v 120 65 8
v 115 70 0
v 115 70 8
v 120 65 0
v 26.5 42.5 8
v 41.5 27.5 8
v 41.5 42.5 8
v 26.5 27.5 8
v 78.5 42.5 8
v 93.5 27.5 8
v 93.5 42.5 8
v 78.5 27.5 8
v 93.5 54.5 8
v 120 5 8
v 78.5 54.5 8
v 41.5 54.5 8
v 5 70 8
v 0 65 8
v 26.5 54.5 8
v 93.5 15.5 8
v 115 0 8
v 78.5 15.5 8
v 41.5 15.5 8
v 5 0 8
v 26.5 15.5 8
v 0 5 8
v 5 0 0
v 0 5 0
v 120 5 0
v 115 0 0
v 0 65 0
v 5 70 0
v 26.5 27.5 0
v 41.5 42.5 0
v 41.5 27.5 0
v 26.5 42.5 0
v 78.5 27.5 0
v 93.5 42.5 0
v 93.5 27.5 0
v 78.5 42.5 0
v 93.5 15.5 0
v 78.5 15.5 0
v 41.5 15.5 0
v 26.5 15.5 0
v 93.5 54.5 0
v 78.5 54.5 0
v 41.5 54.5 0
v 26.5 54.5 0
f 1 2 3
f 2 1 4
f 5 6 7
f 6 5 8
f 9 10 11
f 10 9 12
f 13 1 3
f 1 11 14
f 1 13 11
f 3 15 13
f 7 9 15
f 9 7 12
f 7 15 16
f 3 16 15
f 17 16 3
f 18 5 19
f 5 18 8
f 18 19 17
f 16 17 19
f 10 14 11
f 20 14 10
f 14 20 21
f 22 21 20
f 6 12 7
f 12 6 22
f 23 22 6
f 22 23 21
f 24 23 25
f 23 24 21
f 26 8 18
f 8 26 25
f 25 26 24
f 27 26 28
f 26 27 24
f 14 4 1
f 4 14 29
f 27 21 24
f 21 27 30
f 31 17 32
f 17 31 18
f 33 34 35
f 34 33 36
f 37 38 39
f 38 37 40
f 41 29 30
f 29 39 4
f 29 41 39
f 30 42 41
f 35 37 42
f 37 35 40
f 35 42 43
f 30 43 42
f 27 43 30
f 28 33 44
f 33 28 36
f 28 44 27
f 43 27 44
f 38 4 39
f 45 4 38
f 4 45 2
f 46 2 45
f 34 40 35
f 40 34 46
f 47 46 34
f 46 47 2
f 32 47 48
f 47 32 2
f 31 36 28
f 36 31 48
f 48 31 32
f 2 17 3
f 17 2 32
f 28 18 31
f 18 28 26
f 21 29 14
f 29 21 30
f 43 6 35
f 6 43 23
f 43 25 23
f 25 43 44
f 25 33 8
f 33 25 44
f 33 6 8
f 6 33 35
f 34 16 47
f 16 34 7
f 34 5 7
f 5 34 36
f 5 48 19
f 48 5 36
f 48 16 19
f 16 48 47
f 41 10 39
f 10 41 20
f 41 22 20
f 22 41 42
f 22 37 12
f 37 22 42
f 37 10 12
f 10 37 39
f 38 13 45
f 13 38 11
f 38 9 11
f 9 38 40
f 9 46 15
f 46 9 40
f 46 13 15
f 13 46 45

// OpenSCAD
$fn = 32;

// ----------------------------------------------------------------------
// Windowed plate: 4 voids, 120 x 70 x 8 mm
// ----------------------------------------------------------------------

// --- parameters (mm) ---
plate_l = 120;            // plate length, X
plate_w = 70;             // plate width, Y
plate_t = 8;              // plate thickness, Z
edge_margin = 8;          // wall from the plate edge to any window
win_l = 15;               // pocket length
win_w = 12;               // pocket width
pitch_x = 52;             // grid pitch along X
pitch_y = 27;             // grid pitch along Y
depth_1 = 8;              // depth of void 1 (full thickness = through)
depth_2 = 8;              // depth of void 2 (full thickness = through)
depth_3 = 8;              // depth of void 3 (full thickness = through)
depth_4 = 8;              // depth of void 4 (full thickness = through)
corner_c = 5;             // corner chamfer of the plate

profile = [[5, 0], [115, 0], [120, 5], [120, 65], [115, 70], [5, 70], [0, 65], [0, 5]];  // primary outline, 8 points, counter clockwise
void_1 = [[26.5, 15.5], [41.5, 15.5], [41.5, 27.5], [26.5, 27.5]];  // pocket at grid node 0,0, 4 points
void_2 = [[26.5, 42.5], [41.5, 42.5], [41.5, 54.5], [26.5, 54.5]];  // pocket at grid node 0,1, 4 points
void_3 = [[78.5, 15.5], [93.5, 15.5], [93.5, 27.5], [78.5, 27.5]];  // pocket at grid node 1,0, 4 points
void_4 = [[78.5, 42.5], [93.5, 42.5], [93.5, 54.5], [78.5, 54.5]];  // pocket at grid node 1,1, 4 points

// --- the one profile operation ---
difference() {
  linear_extrude(height = plate_t) polygon(points = profile);
  translate([0, 0, -1])
    linear_extrude(height = plate_t + 2) polygon(points = void_1);
  translate([0, 0, -1])
    linear_extrude(height = plate_t + 2) polygon(points = void_2);
  translate([0, 0, -1])
    linear_extrude(height = plate_t + 2) polygon(points = void_3);
  translate([0, 0, -1])
    linear_extrude(height = plate_t + 2) polygon(points = void_4);
}
